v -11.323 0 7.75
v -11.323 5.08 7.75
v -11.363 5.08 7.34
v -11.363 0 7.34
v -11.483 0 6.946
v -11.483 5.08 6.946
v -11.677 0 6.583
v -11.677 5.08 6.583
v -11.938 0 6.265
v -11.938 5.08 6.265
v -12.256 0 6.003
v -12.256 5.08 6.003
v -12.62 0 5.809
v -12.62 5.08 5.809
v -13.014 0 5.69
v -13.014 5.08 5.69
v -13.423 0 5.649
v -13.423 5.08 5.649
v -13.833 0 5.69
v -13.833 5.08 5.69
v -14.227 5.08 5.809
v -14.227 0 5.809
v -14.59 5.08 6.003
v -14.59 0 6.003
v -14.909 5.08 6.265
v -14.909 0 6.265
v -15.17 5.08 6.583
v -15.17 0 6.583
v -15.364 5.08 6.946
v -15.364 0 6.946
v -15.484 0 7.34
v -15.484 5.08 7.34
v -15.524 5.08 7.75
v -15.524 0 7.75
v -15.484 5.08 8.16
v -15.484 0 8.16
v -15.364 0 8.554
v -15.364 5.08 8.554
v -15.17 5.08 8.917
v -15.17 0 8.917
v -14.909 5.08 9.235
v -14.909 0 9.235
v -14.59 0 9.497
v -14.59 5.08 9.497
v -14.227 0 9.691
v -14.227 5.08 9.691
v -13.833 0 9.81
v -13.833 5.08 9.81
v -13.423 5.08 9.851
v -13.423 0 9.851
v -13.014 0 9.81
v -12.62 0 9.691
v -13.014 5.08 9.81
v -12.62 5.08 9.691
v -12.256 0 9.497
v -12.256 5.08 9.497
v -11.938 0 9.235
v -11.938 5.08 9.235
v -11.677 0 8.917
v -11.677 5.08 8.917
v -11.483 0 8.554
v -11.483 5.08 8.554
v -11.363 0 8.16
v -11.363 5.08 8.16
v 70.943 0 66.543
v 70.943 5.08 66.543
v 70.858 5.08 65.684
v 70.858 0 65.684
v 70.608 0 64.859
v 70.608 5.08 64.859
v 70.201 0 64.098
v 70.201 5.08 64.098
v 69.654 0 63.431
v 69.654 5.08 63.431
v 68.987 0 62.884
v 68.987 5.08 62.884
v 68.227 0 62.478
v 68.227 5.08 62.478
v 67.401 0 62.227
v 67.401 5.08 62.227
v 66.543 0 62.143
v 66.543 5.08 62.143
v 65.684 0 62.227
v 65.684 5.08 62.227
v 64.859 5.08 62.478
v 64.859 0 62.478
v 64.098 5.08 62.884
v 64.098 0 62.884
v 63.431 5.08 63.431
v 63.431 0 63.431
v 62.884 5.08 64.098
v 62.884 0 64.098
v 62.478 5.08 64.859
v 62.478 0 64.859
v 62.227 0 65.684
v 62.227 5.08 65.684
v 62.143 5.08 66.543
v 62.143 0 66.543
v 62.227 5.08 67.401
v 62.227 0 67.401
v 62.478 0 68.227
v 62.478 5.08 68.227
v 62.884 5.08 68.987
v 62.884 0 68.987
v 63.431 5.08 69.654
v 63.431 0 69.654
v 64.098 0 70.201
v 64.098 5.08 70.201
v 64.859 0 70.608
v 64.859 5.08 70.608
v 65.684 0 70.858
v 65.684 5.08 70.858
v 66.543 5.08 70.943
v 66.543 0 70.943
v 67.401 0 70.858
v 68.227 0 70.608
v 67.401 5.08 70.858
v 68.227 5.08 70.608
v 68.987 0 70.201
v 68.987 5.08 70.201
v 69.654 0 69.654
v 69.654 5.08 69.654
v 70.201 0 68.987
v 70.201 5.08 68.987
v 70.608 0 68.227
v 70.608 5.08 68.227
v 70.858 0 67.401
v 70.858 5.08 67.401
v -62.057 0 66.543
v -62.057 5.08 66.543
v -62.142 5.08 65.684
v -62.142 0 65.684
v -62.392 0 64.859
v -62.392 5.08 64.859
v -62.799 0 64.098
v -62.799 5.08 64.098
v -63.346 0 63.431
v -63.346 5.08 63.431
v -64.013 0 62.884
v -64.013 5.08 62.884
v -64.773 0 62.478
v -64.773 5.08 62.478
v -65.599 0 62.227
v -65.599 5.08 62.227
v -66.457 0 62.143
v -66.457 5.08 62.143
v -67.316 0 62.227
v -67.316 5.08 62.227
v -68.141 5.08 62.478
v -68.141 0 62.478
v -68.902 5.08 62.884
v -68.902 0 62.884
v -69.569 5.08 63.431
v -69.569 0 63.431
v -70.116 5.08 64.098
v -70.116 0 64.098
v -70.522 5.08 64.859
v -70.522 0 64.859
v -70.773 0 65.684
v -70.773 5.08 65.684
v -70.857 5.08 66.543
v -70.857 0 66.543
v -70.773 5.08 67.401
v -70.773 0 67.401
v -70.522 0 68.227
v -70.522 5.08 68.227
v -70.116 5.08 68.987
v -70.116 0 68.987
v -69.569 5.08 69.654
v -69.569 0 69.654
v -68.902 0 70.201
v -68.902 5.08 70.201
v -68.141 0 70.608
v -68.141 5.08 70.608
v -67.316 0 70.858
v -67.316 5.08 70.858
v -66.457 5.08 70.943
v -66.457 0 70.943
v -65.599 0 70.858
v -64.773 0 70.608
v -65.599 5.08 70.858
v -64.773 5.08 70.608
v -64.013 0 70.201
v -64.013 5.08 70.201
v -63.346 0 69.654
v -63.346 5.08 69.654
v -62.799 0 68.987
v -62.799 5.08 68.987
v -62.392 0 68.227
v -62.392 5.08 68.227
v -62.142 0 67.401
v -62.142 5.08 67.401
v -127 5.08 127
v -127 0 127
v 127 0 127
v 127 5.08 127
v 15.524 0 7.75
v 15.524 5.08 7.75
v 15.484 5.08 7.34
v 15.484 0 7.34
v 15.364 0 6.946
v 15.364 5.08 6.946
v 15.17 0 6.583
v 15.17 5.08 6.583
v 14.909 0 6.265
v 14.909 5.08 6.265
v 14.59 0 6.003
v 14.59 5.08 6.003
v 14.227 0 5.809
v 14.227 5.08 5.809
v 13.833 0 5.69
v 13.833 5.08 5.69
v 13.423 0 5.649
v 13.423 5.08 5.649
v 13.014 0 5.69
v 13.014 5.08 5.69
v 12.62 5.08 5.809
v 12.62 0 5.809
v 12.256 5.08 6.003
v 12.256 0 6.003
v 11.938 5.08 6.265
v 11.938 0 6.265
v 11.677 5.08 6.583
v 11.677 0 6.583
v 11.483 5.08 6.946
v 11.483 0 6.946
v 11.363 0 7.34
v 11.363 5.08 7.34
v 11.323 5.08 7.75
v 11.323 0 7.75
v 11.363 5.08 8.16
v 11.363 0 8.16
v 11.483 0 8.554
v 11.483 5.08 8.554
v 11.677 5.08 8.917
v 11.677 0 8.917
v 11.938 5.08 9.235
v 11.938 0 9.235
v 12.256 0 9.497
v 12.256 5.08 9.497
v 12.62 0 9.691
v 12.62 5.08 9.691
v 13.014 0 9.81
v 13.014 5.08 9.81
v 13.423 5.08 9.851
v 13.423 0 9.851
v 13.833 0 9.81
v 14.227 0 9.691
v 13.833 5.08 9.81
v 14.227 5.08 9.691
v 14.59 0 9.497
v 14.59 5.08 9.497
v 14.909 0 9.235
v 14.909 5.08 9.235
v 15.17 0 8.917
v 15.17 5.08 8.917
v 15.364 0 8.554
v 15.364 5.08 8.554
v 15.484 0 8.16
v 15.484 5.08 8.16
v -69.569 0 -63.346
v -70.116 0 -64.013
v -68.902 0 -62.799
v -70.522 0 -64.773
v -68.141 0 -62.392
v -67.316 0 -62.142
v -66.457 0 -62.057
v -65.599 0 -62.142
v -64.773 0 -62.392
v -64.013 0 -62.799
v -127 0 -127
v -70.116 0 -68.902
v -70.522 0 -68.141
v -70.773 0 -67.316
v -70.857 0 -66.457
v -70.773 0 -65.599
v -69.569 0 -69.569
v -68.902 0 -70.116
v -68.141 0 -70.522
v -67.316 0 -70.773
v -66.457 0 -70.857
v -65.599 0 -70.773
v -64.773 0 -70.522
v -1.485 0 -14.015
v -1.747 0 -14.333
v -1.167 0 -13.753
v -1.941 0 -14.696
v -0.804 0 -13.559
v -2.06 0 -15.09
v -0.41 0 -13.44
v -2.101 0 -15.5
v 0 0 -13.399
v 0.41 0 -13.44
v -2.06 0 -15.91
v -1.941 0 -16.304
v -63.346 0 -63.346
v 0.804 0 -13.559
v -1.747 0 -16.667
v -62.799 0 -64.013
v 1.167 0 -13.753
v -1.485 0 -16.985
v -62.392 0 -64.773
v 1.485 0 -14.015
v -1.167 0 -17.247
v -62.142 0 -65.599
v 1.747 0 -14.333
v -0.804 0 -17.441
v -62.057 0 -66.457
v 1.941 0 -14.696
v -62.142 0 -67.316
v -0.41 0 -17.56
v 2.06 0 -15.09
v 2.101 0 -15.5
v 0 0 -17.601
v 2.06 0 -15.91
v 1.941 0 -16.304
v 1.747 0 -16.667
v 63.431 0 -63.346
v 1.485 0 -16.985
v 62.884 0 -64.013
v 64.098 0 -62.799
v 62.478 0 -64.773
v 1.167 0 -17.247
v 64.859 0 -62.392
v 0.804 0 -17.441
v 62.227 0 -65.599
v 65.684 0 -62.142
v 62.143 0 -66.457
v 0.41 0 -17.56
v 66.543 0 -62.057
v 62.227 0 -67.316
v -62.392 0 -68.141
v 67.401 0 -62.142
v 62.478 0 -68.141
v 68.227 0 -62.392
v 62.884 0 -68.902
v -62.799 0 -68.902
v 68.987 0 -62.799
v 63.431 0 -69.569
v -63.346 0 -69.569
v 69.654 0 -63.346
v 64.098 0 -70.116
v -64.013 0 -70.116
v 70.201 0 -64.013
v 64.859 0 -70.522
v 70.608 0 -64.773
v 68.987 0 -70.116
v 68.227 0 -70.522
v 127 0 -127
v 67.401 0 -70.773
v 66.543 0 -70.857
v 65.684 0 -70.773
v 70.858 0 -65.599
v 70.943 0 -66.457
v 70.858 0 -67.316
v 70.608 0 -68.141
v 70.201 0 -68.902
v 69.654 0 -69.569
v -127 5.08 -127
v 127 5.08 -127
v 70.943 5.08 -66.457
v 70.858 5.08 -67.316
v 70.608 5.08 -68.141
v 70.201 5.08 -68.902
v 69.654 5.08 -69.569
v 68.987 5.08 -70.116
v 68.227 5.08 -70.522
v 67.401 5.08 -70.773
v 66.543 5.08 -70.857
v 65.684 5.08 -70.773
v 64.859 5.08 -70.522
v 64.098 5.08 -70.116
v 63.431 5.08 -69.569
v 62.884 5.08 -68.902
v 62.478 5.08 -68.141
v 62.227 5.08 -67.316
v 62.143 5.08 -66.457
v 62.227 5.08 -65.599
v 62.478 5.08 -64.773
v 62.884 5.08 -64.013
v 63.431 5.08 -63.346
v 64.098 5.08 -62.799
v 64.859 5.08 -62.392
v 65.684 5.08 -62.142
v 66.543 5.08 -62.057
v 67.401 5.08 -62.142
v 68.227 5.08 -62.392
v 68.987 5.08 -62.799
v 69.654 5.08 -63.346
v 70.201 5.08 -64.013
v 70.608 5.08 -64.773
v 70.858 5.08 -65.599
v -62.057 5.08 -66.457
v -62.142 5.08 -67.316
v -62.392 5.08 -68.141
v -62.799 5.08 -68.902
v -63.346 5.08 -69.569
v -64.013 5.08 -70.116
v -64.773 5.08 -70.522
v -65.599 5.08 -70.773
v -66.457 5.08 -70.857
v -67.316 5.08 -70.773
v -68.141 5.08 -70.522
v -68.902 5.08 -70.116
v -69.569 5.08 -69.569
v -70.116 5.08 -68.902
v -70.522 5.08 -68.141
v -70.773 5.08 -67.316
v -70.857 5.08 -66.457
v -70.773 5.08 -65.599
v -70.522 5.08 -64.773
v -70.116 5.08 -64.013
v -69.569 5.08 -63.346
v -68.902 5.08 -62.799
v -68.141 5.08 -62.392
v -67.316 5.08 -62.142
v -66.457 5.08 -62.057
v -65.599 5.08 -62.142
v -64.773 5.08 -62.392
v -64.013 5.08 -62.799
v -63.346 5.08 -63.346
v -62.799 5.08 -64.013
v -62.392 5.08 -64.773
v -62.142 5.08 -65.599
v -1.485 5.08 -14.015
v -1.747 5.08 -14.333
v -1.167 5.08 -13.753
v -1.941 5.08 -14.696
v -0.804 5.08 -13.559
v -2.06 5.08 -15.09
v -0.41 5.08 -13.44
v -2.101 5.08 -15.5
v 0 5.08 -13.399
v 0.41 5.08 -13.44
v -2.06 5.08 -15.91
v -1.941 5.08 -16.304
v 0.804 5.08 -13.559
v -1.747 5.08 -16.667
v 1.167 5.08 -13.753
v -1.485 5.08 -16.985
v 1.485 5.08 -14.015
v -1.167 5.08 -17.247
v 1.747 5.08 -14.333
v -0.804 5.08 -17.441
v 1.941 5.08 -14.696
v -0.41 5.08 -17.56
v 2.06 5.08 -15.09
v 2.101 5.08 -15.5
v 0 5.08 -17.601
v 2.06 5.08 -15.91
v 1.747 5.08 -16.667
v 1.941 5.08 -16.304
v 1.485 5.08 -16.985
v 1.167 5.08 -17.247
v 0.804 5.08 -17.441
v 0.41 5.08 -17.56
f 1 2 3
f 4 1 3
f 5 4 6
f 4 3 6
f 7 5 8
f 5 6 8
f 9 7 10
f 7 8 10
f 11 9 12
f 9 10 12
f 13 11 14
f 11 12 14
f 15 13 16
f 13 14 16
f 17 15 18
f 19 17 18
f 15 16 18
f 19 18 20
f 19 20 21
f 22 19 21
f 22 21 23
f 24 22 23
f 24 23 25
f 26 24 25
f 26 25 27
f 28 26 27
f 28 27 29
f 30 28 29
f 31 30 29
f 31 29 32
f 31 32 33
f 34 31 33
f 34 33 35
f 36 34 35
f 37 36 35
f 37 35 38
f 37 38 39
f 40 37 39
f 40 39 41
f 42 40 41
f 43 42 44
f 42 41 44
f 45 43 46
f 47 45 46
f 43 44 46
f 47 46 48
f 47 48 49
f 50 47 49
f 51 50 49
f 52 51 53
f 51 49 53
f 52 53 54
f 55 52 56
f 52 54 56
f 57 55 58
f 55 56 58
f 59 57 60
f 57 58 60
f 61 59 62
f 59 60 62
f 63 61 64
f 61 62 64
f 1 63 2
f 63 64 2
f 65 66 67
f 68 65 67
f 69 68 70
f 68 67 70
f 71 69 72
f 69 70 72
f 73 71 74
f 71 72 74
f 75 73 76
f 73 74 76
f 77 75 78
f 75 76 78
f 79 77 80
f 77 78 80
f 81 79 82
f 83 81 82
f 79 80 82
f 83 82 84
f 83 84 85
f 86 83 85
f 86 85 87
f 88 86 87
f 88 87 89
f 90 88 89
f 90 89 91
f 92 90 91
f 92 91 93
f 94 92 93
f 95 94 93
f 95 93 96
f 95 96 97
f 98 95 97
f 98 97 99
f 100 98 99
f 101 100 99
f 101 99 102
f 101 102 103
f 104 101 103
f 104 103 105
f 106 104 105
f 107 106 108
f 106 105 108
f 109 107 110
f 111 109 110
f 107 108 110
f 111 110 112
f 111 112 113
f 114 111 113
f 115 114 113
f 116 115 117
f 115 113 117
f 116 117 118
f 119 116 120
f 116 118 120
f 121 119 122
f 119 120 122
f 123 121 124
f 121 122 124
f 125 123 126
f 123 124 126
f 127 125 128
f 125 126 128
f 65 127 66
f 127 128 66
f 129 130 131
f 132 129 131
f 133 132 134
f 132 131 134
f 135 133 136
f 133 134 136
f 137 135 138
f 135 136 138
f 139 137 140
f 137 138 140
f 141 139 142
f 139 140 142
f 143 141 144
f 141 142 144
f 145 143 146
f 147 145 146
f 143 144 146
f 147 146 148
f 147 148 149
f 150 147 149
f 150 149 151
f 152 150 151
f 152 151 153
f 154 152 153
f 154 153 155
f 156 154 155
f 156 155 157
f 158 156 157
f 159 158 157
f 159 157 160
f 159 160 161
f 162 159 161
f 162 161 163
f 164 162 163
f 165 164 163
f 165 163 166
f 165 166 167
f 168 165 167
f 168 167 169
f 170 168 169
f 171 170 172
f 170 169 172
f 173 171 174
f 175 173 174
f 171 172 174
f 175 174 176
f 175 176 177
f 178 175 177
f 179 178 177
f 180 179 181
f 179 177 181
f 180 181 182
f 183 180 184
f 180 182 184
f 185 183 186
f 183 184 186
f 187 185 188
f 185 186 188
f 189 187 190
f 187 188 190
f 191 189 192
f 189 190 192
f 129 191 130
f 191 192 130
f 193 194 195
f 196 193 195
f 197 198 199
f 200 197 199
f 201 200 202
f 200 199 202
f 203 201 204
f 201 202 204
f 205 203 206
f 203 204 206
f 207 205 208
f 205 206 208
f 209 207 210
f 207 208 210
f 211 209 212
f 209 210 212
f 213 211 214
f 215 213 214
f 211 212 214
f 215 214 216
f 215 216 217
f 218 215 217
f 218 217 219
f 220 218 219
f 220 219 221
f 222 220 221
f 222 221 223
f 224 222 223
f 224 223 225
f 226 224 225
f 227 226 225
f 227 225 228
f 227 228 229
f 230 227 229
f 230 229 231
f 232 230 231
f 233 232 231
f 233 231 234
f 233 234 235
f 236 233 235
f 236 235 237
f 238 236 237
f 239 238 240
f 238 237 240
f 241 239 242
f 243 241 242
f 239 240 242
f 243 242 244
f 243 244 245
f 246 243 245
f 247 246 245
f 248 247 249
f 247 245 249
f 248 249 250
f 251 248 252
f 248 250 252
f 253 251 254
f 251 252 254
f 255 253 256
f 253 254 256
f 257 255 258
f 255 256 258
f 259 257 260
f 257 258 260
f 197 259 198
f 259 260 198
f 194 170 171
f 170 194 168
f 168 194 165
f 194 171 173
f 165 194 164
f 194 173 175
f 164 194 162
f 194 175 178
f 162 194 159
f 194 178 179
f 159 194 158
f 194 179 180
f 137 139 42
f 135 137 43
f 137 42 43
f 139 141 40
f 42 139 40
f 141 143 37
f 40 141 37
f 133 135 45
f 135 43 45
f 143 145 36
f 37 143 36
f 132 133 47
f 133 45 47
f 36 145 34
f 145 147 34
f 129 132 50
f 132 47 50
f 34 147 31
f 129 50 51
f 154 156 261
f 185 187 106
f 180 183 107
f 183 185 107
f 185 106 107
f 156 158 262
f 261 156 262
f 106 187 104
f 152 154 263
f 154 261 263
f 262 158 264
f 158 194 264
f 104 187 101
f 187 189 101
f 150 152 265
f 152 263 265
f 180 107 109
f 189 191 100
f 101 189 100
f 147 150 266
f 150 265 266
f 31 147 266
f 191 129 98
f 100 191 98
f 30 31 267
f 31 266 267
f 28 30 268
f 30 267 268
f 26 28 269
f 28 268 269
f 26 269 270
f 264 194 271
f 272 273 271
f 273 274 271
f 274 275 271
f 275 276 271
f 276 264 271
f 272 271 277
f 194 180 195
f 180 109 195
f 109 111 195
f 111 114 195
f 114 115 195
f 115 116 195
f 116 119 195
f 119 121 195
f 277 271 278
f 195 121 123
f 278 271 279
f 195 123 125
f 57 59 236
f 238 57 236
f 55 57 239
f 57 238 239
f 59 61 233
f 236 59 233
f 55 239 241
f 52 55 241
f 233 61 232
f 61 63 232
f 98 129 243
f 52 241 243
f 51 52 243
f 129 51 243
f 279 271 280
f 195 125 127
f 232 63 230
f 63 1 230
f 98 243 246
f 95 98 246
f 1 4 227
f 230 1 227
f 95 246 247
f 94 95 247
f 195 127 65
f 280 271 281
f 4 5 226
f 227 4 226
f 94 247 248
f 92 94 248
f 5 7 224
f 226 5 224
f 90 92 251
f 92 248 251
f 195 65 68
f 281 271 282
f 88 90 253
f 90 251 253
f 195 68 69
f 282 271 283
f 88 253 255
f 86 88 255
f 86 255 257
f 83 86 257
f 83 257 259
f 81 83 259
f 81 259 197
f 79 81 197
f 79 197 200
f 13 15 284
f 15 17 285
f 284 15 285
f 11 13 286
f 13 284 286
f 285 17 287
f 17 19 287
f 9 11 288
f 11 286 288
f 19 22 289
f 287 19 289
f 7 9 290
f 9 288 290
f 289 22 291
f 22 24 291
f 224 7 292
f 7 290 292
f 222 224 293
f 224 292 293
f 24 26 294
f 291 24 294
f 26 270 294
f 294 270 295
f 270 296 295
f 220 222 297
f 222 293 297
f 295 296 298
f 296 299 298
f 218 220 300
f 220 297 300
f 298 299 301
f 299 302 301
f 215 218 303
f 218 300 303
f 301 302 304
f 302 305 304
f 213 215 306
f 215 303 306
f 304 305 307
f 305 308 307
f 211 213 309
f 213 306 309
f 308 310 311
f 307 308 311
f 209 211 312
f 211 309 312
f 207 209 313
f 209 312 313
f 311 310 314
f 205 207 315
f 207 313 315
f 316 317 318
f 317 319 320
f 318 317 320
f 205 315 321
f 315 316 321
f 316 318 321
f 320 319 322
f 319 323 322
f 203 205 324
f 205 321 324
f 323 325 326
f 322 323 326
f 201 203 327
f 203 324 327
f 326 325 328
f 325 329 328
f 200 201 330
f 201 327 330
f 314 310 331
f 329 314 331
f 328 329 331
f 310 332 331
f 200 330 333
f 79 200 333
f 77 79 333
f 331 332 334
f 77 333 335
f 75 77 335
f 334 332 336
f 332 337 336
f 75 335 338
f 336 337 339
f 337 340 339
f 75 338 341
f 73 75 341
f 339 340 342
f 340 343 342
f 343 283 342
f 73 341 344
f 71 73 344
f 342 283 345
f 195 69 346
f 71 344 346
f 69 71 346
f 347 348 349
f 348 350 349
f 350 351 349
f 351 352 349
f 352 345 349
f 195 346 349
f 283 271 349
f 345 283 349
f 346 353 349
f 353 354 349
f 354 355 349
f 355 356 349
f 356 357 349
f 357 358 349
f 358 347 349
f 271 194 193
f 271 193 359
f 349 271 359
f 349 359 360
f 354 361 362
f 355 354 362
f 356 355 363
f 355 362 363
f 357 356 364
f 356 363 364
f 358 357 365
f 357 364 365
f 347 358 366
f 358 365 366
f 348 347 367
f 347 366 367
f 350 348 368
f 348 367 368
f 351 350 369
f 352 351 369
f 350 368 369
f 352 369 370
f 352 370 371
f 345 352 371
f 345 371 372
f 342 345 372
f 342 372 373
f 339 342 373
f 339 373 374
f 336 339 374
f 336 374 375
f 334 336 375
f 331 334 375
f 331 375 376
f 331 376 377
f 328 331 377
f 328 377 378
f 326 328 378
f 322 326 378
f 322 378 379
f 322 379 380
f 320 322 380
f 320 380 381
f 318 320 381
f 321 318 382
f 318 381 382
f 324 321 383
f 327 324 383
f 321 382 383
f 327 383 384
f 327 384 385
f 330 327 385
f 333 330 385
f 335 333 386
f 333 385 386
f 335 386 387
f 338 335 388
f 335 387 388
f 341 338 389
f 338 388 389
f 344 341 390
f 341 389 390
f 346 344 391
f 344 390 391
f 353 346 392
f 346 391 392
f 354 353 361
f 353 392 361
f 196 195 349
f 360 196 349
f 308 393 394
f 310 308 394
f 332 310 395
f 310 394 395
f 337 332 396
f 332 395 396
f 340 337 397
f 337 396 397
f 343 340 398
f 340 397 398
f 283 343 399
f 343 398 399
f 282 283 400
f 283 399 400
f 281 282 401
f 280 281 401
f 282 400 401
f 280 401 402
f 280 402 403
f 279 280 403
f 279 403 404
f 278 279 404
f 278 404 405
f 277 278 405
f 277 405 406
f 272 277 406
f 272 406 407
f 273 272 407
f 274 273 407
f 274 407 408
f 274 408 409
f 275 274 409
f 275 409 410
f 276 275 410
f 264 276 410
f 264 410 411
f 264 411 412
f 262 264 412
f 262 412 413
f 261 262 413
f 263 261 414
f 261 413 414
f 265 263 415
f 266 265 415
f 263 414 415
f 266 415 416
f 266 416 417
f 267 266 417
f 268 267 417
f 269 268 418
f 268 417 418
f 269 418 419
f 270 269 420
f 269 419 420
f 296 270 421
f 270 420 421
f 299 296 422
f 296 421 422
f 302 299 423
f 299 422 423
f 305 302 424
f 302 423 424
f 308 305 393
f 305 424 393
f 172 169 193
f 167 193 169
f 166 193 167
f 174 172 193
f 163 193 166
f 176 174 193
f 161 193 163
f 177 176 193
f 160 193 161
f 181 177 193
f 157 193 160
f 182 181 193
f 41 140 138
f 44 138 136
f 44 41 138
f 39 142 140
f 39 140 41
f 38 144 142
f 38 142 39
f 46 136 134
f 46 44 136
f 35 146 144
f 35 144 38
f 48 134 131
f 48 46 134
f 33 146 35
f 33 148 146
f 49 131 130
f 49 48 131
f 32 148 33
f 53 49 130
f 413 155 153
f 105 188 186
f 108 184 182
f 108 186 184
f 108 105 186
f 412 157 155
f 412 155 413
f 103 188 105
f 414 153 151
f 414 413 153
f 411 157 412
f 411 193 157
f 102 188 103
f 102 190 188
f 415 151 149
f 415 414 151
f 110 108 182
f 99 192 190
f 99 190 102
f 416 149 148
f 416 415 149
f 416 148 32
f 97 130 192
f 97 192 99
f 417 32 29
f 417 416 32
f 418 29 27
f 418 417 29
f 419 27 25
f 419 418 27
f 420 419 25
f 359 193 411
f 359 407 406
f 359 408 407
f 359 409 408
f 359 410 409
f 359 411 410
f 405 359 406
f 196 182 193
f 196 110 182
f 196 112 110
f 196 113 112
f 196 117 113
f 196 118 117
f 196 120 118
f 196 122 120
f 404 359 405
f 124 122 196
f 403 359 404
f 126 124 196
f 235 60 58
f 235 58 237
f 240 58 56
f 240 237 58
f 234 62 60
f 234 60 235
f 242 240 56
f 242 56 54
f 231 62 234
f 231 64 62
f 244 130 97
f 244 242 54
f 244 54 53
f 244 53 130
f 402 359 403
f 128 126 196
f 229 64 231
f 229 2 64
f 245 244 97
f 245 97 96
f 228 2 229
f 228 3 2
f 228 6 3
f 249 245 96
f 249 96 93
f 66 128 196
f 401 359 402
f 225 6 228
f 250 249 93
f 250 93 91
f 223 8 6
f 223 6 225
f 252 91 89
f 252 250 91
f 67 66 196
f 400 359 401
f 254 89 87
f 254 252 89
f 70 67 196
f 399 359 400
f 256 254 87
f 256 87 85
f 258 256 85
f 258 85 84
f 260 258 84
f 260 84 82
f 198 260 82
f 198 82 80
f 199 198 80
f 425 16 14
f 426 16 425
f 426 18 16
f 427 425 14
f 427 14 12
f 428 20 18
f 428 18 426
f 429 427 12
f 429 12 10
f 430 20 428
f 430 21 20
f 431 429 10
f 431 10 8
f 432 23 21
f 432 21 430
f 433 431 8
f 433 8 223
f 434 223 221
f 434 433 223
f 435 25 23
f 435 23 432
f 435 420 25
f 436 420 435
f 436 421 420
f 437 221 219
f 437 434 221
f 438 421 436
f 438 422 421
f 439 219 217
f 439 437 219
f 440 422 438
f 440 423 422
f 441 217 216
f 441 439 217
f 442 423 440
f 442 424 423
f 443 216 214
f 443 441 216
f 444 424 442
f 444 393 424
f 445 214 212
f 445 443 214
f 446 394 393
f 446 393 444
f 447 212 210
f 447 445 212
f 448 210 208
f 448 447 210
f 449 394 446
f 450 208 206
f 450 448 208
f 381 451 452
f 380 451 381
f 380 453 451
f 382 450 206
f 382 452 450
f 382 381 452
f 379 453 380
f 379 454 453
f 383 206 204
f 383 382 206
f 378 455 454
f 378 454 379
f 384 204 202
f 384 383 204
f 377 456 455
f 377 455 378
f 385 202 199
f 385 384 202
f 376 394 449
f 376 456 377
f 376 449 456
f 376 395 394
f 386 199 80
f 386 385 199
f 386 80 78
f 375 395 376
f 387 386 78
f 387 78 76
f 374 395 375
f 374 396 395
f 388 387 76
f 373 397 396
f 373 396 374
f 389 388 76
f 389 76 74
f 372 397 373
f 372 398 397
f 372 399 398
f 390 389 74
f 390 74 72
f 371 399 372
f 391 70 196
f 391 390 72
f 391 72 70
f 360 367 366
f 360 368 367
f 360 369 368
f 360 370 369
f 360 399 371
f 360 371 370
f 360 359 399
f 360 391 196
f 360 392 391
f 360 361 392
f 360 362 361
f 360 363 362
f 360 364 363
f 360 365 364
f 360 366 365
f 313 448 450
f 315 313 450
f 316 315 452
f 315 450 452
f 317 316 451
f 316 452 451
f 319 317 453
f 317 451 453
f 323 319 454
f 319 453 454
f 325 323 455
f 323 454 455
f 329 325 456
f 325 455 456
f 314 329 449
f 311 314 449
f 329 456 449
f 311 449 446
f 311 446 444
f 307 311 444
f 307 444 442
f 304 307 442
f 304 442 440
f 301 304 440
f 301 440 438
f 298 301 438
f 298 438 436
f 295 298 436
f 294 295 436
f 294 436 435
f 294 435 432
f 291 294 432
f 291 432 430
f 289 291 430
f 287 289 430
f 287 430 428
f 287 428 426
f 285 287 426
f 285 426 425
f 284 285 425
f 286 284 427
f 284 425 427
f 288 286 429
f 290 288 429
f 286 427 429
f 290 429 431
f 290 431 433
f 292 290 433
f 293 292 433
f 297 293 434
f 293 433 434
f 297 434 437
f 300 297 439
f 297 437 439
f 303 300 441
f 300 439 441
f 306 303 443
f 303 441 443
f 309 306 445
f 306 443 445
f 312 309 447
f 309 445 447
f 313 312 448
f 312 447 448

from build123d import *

# Parameters (mm, degrees)
SKETCH1_W           = 254
SKETCH1_H           = 254
BOSS_EXTRUDE1_DEPTH = 5.08
SKETCH2_R           = 2.10058
CUT_EXTRUDE1_DEPTH  = 6.08
SKETCH5_R           = 4.399999963
CUT_EXTRUDE2_DEPTH  = 6.08


with BuildPart() as part:
    # Sketch1 → Boss-Extrude1 (new body)
    with BuildSketch(Plane(origin=(0, 0, 0), x_dir=(1, 0, 0), z_dir=(0, 1, 0))):
        Rectangle(SKETCH1_W, SKETCH1_H)
    extrude(amount=BOSS_EXTRUDE1_DEPTH)

    # Sketch2 → Cut-Extrude1 (cut, through all)
    with BuildSketch(Plane(origin=(0, 5.08, 0), x_dir=(1, 0, 0), z_dir=(0, 1, 0))):
        with Locations((0, 15.499969)):
            Circle(SKETCH2_R)
        with Locations((13.423366912, -7.7499845)):
            Circle(SKETCH2_R)
        with Locations((-13.423366912, -7.7499845)):
            Circle(SKETCH2_R)
    extrude(amount=-CUT_EXTRUDE1_DEPTH, mode=Mode.SUBTRACT)

    # Sketch5 → Cut-Extrude2 (cut, through all)
    with BuildSketch(Plane(origin=(0, 5.08, 0), x_dir=(1, 0, 0), z_dir=(0, 1, 0))):
        with Locations((66.542698013, 66.4572719)):
            Circle(SKETCH5_R)
        with Locations((66.542698013, -66.542698013)):
            Circle(SKETCH5_R)
        with Locations((-66.4572719, -66.542698013)):
            Circle(SKETCH5_R)
        with Locations((-66.4572719, 66.4572719)):
            Circle(SKETCH5_R)
    extrude(amount=-CUT_EXTRUDE2_DEPTH, mode=Mode.SUBTRACT)


solid = part.part
